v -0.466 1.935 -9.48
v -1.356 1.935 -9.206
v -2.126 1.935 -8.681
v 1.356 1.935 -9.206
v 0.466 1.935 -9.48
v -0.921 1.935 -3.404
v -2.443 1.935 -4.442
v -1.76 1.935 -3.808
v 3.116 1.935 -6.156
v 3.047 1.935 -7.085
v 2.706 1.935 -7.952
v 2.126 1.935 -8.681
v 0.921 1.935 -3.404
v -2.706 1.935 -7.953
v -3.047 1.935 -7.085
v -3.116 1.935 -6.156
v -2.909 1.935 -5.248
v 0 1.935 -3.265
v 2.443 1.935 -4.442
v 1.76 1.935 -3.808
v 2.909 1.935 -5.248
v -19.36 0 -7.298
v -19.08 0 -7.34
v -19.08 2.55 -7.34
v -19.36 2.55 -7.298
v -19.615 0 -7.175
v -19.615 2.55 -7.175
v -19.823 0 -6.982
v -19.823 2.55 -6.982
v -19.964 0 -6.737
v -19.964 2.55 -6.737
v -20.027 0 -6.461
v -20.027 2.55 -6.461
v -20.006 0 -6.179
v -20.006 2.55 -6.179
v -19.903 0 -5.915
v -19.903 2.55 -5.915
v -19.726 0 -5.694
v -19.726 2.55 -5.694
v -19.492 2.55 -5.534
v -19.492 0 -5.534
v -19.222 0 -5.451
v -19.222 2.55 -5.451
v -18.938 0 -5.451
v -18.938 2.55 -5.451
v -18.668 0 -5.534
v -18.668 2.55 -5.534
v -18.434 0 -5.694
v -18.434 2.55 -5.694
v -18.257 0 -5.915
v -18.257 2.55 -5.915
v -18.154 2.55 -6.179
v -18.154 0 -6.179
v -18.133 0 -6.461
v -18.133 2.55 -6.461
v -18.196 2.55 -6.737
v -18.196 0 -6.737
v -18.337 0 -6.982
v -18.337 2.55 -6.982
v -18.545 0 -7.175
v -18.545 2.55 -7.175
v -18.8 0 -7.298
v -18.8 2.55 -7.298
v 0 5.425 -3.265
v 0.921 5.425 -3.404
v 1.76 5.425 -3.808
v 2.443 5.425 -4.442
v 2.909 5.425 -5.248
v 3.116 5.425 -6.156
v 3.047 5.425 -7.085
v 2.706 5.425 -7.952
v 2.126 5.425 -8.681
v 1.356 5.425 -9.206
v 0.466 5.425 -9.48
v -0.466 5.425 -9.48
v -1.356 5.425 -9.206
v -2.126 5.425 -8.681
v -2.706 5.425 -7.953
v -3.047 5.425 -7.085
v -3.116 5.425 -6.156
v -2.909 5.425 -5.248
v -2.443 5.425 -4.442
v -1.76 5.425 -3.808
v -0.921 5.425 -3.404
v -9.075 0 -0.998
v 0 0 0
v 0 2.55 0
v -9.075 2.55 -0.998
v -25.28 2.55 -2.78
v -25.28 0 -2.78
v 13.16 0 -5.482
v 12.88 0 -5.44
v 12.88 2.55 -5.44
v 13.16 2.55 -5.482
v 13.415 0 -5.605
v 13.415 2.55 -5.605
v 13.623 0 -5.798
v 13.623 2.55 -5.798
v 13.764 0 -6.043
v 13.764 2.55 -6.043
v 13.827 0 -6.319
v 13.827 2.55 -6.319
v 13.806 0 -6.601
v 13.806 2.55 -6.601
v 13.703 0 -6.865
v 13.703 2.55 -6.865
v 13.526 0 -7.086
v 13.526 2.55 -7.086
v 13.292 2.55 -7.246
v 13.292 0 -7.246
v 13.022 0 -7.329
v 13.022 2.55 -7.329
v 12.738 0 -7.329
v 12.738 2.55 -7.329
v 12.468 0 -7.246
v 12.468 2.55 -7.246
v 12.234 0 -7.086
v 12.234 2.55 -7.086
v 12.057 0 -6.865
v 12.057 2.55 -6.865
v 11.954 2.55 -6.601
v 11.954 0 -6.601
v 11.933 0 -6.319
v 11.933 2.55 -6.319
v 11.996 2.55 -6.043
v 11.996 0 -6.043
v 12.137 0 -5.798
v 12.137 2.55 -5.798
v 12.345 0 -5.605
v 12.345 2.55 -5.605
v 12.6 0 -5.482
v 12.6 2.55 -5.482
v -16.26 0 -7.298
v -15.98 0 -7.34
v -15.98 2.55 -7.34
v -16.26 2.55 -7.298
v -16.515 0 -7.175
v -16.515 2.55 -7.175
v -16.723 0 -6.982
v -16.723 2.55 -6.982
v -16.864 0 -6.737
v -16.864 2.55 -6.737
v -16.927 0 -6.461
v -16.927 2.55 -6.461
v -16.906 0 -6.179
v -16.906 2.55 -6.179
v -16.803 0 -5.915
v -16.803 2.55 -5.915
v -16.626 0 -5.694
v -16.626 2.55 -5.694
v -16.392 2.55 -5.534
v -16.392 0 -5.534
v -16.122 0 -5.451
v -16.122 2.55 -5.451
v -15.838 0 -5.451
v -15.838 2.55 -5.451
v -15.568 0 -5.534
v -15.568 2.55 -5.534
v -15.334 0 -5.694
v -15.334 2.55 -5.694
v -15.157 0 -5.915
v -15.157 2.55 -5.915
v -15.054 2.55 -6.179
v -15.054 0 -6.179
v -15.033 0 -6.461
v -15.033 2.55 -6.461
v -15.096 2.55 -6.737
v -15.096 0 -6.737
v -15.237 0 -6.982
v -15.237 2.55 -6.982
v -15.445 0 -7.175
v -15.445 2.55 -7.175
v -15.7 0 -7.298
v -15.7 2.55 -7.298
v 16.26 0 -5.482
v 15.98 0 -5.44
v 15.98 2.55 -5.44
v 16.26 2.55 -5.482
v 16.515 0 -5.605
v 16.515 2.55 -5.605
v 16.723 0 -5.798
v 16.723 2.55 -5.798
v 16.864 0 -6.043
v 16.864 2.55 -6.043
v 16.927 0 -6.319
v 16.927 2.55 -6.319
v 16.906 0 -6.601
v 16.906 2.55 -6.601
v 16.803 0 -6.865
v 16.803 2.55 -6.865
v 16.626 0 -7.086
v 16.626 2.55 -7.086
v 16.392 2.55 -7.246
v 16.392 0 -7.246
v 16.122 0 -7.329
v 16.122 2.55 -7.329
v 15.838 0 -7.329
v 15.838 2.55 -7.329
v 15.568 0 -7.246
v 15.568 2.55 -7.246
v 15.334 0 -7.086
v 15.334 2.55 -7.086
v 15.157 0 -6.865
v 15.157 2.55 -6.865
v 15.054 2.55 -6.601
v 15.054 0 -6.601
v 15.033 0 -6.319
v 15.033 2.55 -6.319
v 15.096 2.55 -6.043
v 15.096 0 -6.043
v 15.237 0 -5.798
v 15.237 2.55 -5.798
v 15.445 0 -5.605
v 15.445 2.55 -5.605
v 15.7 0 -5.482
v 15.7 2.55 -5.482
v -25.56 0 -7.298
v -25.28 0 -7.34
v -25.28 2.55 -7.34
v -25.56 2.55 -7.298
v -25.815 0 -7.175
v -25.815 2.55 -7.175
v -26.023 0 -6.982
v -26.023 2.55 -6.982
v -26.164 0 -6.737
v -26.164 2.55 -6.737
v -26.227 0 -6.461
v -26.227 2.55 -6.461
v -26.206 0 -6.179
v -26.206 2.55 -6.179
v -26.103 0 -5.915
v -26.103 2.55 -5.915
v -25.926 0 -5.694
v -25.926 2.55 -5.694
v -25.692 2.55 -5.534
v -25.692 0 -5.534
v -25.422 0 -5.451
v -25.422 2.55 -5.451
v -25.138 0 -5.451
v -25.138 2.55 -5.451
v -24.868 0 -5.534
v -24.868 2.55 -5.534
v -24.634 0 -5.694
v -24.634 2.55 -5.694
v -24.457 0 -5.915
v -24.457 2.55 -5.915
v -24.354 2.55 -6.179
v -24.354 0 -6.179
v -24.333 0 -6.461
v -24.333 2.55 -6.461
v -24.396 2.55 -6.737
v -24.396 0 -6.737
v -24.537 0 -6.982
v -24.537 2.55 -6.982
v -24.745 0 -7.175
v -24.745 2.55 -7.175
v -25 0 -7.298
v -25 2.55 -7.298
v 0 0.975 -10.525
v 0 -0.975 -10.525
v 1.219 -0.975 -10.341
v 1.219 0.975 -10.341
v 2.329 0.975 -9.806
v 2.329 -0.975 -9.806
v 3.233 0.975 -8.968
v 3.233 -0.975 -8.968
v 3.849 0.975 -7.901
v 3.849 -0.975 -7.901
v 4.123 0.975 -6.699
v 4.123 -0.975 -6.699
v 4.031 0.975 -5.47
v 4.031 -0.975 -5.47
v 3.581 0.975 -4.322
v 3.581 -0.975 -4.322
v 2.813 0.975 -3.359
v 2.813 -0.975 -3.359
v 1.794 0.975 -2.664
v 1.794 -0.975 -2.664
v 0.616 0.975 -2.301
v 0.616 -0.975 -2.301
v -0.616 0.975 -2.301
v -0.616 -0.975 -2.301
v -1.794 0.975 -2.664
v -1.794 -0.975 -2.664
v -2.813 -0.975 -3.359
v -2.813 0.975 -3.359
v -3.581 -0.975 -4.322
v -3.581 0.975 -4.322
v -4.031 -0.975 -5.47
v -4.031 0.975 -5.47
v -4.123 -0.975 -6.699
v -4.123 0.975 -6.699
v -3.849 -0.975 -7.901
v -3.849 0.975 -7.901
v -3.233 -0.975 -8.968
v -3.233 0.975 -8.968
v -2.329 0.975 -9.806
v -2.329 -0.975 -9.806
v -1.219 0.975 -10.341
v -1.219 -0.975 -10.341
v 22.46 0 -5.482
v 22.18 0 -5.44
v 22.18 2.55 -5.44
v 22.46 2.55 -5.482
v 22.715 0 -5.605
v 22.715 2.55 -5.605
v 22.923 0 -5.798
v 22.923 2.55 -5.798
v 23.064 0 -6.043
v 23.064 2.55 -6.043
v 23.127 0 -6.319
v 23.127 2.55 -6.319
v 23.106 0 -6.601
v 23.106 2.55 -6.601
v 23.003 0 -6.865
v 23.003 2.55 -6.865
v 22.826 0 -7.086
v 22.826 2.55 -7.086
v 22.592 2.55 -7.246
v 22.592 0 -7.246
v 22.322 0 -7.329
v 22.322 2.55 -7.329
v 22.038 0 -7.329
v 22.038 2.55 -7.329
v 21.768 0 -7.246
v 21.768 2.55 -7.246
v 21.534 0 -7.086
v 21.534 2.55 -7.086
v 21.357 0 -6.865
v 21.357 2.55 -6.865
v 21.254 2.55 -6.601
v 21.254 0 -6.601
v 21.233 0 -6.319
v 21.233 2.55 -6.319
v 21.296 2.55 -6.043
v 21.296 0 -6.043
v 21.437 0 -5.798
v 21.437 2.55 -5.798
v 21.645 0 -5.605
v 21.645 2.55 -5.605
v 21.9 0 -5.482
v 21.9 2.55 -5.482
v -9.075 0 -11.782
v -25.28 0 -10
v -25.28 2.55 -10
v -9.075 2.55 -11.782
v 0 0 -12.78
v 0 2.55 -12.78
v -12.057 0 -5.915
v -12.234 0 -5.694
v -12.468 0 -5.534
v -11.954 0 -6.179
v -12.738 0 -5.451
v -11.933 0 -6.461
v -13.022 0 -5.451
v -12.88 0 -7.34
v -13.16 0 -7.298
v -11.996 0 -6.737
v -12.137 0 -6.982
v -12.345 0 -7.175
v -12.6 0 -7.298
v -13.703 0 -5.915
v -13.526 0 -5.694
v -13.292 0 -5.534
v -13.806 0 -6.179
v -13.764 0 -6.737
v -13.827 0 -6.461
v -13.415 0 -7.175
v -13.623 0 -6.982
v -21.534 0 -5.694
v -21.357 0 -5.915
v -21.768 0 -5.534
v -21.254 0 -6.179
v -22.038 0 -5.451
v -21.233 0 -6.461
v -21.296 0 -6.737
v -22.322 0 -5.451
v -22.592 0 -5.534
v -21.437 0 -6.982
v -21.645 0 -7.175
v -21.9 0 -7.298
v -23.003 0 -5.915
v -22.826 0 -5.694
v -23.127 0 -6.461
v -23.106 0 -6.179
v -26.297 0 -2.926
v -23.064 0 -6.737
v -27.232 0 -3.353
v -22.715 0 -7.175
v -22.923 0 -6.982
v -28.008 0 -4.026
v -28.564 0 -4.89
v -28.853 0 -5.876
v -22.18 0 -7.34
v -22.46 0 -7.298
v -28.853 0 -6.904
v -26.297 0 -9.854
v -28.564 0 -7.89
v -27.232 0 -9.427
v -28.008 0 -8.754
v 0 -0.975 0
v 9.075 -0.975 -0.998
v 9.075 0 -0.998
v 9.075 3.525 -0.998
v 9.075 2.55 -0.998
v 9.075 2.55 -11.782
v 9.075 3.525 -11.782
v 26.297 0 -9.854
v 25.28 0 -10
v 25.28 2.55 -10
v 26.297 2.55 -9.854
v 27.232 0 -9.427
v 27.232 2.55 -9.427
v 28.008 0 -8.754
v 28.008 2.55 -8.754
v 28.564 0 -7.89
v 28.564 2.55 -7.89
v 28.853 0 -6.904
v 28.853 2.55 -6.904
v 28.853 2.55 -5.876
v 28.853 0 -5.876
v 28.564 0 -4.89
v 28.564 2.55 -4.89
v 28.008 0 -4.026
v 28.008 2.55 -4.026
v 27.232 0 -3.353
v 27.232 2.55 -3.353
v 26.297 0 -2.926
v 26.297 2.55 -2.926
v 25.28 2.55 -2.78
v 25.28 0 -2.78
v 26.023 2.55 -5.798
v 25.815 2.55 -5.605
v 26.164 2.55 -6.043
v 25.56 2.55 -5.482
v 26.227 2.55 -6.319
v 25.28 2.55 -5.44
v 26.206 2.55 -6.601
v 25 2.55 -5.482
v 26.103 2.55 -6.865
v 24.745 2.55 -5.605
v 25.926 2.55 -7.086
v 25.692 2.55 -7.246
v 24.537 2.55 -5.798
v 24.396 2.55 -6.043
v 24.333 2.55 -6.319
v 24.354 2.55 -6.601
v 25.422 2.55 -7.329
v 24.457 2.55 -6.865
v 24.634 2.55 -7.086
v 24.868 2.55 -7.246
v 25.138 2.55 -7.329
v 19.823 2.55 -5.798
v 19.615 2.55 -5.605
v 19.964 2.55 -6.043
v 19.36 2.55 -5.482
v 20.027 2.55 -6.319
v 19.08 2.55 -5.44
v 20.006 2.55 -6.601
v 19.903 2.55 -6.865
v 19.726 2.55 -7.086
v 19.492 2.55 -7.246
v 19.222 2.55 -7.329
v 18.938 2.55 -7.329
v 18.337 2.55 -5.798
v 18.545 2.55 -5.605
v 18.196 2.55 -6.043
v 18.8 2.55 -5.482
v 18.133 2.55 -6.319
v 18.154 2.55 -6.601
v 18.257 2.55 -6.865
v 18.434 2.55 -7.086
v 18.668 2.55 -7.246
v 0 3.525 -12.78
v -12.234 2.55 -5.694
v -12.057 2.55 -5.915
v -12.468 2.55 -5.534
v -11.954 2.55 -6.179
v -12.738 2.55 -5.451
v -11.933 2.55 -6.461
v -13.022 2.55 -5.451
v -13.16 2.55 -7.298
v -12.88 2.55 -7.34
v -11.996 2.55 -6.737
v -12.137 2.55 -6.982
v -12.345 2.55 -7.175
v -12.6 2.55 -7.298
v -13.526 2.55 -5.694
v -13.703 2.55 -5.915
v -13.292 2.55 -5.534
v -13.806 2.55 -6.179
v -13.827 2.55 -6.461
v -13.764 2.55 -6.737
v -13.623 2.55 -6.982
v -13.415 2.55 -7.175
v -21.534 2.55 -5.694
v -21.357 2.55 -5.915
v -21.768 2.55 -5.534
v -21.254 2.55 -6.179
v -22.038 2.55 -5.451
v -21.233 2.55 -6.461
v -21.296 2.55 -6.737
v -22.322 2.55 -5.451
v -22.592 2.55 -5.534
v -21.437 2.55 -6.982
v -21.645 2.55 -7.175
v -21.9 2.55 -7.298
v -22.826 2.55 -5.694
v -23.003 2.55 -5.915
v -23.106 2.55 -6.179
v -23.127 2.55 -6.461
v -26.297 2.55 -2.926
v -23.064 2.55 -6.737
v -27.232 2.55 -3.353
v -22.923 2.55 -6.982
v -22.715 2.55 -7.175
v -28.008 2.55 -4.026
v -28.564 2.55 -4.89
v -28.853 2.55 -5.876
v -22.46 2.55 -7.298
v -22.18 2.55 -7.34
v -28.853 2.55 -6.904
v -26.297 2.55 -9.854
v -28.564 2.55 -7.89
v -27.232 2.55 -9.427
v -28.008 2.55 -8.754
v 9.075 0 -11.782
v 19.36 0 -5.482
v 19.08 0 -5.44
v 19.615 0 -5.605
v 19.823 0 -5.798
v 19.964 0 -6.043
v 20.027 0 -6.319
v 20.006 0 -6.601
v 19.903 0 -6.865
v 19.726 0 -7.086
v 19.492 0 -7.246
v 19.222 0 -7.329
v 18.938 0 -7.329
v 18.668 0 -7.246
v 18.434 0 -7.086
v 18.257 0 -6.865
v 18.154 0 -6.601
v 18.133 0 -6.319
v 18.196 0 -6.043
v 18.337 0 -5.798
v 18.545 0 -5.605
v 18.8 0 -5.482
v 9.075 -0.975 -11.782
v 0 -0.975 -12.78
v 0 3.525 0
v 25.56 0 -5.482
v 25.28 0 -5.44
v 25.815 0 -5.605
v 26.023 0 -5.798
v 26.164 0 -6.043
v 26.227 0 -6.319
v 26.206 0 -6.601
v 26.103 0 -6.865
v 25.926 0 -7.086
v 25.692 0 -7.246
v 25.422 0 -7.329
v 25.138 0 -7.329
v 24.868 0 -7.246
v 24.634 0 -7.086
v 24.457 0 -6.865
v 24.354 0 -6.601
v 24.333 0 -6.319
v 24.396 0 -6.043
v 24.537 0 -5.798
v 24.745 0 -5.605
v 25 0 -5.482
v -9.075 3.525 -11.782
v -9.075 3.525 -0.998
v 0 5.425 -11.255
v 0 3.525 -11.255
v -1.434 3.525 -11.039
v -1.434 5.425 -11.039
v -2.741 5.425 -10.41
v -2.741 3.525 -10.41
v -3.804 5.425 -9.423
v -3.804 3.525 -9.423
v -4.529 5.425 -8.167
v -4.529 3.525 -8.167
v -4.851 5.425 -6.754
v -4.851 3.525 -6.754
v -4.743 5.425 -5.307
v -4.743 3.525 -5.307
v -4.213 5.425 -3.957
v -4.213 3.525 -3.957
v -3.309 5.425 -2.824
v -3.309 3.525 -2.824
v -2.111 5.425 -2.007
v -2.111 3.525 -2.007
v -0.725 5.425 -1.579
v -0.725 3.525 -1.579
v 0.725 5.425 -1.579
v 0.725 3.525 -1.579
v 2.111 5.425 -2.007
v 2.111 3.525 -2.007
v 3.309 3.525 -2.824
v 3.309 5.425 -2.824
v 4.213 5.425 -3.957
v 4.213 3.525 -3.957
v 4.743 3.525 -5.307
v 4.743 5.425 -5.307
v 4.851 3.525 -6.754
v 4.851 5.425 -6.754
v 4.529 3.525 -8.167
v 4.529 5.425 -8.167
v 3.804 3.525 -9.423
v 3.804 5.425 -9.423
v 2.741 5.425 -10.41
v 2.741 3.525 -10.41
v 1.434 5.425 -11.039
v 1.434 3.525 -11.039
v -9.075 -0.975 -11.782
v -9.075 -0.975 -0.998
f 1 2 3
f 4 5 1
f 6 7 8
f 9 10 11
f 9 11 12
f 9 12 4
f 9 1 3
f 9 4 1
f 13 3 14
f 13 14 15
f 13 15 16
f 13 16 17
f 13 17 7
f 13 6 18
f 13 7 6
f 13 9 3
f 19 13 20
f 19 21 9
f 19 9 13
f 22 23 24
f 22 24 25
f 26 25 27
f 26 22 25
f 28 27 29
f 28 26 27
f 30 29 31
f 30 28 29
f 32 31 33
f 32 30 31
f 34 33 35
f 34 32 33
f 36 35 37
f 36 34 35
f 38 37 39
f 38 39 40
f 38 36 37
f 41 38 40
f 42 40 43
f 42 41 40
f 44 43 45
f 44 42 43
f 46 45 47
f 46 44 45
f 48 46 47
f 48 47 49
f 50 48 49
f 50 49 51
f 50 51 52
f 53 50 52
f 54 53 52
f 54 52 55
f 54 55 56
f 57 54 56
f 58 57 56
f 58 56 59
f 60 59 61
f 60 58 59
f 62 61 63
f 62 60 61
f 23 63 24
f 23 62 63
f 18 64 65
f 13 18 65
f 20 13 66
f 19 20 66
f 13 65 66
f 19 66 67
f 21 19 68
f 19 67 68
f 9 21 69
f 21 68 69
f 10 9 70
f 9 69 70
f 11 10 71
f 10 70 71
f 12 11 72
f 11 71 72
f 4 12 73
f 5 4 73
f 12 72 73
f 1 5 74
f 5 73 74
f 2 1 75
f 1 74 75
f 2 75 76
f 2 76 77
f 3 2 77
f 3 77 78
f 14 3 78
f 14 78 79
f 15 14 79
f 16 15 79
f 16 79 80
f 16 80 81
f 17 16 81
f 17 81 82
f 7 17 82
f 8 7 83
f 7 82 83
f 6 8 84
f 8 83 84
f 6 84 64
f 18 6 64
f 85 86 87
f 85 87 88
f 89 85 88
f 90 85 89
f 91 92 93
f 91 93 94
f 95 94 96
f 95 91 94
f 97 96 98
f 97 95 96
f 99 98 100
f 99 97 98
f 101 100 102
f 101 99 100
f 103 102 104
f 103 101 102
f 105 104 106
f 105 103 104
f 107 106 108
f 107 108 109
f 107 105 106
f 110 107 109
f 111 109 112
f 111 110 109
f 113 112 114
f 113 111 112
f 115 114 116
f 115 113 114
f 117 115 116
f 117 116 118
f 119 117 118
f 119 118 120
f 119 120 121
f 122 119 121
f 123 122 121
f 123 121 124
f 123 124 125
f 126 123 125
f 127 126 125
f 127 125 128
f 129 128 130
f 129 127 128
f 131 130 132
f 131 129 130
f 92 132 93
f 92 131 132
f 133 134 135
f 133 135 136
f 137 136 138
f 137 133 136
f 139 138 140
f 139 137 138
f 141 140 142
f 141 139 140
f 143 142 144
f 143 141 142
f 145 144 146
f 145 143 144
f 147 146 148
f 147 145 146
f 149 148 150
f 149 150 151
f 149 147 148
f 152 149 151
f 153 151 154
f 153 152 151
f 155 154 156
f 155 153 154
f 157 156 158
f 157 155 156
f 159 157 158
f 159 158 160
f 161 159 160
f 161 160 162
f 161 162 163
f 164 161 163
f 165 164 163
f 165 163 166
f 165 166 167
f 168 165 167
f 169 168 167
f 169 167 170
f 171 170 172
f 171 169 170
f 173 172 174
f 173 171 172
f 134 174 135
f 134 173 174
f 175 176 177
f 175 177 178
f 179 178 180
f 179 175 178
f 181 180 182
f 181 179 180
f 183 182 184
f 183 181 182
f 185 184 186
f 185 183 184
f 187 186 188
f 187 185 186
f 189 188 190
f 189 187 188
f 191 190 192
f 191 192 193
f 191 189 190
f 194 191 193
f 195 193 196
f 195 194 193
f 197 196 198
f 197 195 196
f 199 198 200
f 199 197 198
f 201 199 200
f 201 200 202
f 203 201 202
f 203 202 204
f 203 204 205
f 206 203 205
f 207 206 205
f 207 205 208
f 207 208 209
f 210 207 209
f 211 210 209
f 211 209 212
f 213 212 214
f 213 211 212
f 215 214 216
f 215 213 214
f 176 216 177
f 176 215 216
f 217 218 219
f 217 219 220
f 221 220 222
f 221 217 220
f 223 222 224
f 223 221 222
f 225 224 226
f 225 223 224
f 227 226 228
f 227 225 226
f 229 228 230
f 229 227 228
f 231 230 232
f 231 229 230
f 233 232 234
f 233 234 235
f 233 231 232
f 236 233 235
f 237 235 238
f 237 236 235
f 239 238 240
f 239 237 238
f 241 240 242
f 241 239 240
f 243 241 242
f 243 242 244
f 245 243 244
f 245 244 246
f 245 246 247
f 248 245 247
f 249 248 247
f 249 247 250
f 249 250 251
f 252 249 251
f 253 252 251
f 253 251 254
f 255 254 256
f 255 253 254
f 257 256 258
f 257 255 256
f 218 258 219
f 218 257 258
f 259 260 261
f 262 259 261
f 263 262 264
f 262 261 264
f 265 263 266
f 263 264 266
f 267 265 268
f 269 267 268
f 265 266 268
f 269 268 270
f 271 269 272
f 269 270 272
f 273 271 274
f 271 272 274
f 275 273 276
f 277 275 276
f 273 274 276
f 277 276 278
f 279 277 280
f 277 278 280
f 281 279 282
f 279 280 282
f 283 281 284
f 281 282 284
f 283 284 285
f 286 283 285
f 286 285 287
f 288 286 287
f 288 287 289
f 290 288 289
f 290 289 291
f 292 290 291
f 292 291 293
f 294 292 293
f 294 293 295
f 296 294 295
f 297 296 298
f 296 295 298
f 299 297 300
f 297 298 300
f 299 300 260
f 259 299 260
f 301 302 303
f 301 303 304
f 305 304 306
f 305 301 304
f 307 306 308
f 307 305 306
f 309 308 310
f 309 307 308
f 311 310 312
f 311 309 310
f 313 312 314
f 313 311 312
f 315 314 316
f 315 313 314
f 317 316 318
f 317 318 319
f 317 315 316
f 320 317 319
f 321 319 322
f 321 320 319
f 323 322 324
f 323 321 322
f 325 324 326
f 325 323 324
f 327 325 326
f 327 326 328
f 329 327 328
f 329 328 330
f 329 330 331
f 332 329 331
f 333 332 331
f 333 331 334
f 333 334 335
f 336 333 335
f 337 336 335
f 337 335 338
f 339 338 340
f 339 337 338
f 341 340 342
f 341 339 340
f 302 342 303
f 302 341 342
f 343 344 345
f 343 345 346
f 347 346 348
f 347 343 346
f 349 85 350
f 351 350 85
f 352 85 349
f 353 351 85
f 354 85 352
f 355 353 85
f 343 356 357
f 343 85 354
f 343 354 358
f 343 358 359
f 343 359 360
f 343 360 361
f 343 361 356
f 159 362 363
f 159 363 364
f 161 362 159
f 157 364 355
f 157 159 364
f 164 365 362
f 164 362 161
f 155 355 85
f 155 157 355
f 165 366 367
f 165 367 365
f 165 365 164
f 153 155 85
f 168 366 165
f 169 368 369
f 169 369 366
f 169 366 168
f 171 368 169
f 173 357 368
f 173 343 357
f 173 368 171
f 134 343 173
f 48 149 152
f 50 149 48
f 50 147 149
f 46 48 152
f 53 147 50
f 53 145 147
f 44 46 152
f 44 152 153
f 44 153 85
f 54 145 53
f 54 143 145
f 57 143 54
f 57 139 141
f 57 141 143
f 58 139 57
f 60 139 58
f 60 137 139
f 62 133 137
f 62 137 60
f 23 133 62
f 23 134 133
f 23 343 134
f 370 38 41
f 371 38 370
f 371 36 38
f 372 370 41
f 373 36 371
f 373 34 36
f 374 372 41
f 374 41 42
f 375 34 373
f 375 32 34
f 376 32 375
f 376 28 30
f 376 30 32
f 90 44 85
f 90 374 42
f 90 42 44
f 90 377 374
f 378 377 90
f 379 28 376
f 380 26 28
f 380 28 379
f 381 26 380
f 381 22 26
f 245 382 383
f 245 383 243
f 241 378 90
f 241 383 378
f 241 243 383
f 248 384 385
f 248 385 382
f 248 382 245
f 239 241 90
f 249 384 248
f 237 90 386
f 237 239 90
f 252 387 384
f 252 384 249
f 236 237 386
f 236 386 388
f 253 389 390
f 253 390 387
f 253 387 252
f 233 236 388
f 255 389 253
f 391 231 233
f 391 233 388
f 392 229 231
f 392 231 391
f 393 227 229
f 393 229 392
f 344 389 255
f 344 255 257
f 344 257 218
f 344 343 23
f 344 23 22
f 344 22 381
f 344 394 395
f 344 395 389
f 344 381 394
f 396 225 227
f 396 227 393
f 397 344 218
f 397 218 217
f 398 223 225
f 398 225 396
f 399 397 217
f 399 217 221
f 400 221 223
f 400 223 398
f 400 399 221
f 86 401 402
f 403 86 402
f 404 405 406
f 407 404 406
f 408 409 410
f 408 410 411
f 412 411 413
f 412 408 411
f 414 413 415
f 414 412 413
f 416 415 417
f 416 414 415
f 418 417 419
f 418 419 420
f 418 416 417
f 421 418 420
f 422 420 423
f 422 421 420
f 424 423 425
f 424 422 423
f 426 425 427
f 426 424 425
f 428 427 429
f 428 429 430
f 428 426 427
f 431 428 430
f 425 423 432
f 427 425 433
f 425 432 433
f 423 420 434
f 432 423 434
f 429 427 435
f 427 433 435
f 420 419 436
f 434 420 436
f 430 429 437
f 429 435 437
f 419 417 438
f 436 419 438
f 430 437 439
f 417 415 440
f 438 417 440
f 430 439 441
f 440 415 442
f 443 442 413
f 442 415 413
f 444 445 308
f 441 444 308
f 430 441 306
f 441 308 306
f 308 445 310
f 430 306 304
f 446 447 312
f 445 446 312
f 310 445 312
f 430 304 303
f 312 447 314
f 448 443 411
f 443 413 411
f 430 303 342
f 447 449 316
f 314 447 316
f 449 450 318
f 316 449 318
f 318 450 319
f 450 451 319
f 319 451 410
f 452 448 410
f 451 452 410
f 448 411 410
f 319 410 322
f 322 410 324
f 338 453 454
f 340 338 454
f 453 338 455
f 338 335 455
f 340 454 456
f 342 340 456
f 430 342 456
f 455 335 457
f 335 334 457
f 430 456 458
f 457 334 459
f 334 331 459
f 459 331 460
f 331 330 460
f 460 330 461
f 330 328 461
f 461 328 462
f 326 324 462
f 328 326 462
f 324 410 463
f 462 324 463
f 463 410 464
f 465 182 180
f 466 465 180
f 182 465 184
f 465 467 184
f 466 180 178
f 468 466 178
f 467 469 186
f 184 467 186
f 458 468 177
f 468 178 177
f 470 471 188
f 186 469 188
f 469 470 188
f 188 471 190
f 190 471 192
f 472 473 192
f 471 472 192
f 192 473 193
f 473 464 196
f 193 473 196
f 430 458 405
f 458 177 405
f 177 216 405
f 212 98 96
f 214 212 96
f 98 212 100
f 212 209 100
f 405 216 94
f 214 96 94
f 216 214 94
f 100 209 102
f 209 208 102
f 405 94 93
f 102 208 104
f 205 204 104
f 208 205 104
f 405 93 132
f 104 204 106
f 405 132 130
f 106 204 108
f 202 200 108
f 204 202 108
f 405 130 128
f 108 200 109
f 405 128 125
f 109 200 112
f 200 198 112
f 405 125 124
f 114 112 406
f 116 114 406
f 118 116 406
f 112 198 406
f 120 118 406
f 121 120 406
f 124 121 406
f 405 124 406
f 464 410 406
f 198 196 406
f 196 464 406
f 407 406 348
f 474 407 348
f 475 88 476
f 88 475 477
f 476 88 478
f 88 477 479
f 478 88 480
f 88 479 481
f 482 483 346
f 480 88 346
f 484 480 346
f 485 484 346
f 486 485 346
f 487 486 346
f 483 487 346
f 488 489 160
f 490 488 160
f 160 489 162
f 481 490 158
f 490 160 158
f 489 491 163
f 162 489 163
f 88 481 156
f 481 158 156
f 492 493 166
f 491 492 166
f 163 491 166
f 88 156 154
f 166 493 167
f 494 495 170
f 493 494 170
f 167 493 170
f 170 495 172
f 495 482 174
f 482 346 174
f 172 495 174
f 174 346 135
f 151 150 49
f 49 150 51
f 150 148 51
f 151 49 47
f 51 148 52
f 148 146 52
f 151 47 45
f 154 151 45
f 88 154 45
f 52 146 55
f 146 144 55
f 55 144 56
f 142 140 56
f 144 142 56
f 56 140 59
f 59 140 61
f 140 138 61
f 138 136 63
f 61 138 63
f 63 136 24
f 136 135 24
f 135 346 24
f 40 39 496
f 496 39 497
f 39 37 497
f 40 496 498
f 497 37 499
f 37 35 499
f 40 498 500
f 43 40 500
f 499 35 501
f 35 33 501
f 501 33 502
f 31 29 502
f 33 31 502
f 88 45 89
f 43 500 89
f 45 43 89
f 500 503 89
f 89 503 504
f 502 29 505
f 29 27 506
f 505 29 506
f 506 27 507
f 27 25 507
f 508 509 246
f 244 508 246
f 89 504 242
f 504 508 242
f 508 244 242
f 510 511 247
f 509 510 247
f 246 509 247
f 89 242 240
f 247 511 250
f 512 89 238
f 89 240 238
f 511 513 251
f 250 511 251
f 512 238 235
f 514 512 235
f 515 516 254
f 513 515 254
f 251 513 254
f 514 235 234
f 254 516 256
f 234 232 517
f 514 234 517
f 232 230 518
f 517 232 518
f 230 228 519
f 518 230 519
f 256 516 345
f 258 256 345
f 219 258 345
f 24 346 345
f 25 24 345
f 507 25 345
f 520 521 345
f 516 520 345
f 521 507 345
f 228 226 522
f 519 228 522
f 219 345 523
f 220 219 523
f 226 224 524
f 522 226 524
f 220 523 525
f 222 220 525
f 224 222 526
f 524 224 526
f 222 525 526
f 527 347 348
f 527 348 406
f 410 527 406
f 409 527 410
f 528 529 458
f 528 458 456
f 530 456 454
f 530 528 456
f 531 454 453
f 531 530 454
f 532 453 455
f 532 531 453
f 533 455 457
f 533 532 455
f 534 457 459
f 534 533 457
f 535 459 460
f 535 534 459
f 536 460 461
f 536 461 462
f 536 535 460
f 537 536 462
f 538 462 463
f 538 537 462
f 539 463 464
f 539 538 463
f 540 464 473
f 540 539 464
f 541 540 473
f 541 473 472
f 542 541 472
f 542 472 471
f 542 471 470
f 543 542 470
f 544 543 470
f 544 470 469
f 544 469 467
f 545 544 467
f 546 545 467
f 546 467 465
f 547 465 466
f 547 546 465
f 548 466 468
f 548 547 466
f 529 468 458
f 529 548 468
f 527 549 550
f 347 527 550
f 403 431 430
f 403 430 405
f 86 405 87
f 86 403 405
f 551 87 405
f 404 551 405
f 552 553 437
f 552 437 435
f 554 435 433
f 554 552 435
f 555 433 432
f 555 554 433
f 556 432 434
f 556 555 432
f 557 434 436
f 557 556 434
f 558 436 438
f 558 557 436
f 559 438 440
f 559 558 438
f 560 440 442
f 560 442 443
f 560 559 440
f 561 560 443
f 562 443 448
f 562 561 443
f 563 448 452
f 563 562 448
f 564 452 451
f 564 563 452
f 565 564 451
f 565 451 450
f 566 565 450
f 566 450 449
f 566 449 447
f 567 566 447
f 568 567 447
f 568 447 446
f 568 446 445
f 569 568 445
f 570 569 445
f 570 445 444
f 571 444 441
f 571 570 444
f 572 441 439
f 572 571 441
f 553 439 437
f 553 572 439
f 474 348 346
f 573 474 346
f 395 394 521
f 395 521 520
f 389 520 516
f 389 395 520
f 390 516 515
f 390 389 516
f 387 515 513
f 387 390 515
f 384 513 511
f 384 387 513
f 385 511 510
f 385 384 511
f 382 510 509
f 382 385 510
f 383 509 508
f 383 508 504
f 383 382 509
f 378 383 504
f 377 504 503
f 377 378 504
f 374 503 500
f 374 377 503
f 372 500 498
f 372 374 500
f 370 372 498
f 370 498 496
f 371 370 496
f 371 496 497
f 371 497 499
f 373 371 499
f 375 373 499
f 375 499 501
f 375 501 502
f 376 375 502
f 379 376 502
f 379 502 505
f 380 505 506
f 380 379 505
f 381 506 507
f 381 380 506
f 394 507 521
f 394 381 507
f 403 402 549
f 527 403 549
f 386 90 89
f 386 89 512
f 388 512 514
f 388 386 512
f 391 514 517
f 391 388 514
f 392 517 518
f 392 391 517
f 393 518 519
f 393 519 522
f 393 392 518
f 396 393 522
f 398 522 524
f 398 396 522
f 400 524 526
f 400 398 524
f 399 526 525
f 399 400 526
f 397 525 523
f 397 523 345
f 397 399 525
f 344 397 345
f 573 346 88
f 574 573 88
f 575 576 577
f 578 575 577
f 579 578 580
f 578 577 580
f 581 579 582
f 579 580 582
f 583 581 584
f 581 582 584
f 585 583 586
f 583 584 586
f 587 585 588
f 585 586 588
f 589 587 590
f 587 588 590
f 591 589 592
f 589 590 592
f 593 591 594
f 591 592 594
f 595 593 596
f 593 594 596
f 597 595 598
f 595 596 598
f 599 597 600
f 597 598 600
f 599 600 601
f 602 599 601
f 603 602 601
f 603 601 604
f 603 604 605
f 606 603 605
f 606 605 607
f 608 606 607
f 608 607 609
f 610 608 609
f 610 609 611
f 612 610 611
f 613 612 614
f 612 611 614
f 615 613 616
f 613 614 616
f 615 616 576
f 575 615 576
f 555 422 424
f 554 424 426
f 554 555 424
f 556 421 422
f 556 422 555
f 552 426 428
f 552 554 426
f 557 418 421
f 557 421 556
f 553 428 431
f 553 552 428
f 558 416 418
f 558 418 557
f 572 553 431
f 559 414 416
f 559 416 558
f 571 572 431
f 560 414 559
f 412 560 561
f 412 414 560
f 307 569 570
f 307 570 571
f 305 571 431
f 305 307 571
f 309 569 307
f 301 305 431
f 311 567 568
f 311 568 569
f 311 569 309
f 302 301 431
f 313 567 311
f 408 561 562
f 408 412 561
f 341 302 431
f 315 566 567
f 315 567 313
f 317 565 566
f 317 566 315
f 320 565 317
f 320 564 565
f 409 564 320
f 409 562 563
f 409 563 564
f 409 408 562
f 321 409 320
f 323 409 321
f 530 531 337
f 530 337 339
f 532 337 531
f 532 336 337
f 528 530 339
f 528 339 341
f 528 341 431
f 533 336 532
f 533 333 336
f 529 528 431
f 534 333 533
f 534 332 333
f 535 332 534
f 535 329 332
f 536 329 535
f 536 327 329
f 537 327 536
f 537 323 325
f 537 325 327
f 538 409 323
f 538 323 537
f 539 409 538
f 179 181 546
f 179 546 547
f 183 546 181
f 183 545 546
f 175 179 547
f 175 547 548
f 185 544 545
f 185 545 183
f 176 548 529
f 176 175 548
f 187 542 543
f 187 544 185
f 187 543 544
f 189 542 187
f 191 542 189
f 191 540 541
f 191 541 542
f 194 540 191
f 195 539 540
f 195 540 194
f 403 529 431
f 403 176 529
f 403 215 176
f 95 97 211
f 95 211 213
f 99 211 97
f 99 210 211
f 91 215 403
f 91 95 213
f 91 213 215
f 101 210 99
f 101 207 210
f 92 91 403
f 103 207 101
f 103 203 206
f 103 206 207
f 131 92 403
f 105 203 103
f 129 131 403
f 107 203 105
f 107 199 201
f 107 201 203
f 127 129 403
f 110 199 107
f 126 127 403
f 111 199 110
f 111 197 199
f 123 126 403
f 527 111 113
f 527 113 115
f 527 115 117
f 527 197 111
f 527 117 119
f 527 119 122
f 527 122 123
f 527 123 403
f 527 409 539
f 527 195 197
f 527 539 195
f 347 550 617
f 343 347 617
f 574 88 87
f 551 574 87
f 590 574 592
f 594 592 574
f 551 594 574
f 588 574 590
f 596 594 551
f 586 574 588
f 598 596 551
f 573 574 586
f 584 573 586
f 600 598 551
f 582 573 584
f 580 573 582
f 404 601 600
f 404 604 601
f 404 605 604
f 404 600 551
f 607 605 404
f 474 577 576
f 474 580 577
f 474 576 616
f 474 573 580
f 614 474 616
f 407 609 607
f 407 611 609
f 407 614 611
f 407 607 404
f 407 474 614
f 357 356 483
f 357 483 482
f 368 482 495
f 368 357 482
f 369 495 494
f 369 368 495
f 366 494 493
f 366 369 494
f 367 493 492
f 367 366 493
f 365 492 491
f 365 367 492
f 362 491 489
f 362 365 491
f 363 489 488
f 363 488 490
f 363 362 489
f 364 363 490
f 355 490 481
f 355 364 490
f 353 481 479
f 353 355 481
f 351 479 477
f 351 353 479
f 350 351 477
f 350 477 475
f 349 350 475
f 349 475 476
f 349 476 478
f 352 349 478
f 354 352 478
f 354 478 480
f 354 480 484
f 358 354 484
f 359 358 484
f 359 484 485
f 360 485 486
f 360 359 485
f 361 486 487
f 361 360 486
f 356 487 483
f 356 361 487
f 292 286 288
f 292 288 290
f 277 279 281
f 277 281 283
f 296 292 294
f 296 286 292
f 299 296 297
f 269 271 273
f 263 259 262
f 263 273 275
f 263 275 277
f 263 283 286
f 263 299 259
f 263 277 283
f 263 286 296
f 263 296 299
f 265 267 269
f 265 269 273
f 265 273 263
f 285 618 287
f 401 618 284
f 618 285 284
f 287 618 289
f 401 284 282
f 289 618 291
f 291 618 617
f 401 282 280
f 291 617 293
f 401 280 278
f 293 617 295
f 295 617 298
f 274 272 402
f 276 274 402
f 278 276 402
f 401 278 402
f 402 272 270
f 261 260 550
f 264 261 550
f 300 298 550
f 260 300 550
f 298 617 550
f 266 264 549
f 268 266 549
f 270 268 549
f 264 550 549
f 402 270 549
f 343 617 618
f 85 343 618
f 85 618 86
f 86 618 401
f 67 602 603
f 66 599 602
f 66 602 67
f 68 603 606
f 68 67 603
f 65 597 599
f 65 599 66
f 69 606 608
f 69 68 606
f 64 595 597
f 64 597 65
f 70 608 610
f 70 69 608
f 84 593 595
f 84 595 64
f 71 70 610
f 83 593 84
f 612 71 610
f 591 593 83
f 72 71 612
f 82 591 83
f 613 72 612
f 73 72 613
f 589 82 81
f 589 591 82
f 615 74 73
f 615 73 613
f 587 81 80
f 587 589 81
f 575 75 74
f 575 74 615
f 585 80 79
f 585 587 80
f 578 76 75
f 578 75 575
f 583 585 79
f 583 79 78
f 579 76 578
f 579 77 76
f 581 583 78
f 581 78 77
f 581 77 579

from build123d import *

# Parameters (mm, degrees)
SKETCH1_R                = 0.95
BOSS_EXTRUDE1_DEPTH      = 2.55
BOSS_EXTRUDE2_DEPTH      = 0.975
BOSS_EXTRUDE2_DEPTH_BACK = 3.525
SKETCH3_R                = 4.135
CUT_EXTRUDE1_DEPTH       = 1.95
SKETCH4_R                = 4.865
BOSS_EXTRUDE3_DEPTH      = 1.9
SKETCH5_R                = 3.125
CUT_EXTRUDE2_DEPTH       = 3.49


with BuildPart() as part:
    # Sketch1 → Boss-Extrude1 (new body)
    with BuildSketch(Plane(origin=(0, 0, 0), x_dir=(1, 0, 0), z_dir=(0, 1, 0))):
        with BuildLine():
            Line((0, 12.78), (25.28, 10))
            ThreePointArc((25.28, 10), (28.89, 6.39), (25.28, 2.78))
            Line((25.28, 2.78), (0, 0))
            Line((0, 0), (-25.28, 2.78))
            ThreePointArc((-25.28, 2.78), (-28.89, 6.39), (-25.28, 10))
            Line((-25.28, 10), (0, 12.78))
        make_face()
        with Locations(Location((25.28, 6.39, 0), (0, 0, 270))):
            Circle(SKETCH1_R, mode=Mode.SUBTRACT)
        with Locations(Location((22.18, 6.39, 0), (0, 0, 270))):
            Circle(SKETCH1_R, mode=Mode.SUBTRACT)
        with Locations(Location((19.08, 6.39, 0), (0, 0, 270))):
            Circle(SKETCH1_R, mode=Mode.SUBTRACT)
        with Locations(Location((15.98, 6.39, 0), (0, 0, 270))):
            Circle(SKETCH1_R, mode=Mode.SUBTRACT)
        with Locations(Location((12.88, 6.39, 0), (0, 0, 270))):
            Circle(SKETCH1_R, mode=Mode.SUBTRACT)
        with Locations(Location((-12.88, 6.39, 0), (0, 0, 90))):
            Circle(SKETCH1_R, mode=Mode.SUBTRACT)
        with Locations(Location((-15.98, 6.39, 0), (0, 0, 90))):
            Circle(SKETCH1_R, mode=Mode.SUBTRACT)
        with Locations(Location((-19.08, 6.39, 0), (0, 0, 90))):
            Circle(SKETCH1_R, mode=Mode.SUBTRACT)
        with Locations(Location((-22.18, 6.39, 0), (0, 0, 90))):
            Circle(SKETCH1_R, mode=Mode.SUBTRACT)
        with Locations(Location((-25.28, 6.39, 0), (0, 0, 90))):
            Circle(SKETCH1_R, mode=Mode.SUBTRACT)
    extrude(amount=BOSS_EXTRUDE1_DEPTH)

    # Sketch2 → Boss-Extrude2 (add, two sides: drawn at the far end of the back side and taken through both)
    with BuildSketch(Plane(origin=(0, 2.55, 0), x_dir=(1, 0, 0), z_dir=(0, 1, 0)).offset(-BOSS_EXTRUDE2_DEPTH_BACK)):
        Polygon((-9.075, 11.782037184), (-9.075, 0.997962816), (0, 0), (9.075, 0.997962816), (9.075, 11.782037184), (0, 12.78), align=None)
    extrude(amount=BOSS_EXTRUDE2_DEPTH + BOSS_EXTRUDE2_DEPTH_BACK)

    # Sketch3 → Cut-Extrude1 (cut)
    with BuildSketch(Plane.XZ.offset(0.975)):
        with Locations(Location((0, -6.39, 0), (0, 0, 270))):
            Circle(SKETCH3_R)
    extrude(amount=-CUT_EXTRUDE1_DEPTH, mode=Mode.SUBTRACT)

    # Sketch4 → Boss-Extrude3 (add)
    with BuildSketch(Plane(origin=(0, 3.525, 0), x_dir=(1, 0, 0), z_dir=(0, 1, 0))):
        with Locations(Location((0, 6.39, 0), (0, 0, 90))):
            Circle(SKETCH4_R)
    extrude(amount=BOSS_EXTRUDE3_DEPTH)

    # Sketch5 → Cut-Extrude2 (cut)
    with BuildSketch(Plane(origin=(0, 5.425, 0), x_dir=(1, 0, 0), z_dir=(0, 1, 0))):
        with Locations(Location((0, 6.39, 0), (0, 0, 270))):
            Circle(SKETCH5_R)
    extrude(amount=-CUT_EXTRUDE2_DEPTH, mode=Mode.SUBTRACT)


solid = part.part
